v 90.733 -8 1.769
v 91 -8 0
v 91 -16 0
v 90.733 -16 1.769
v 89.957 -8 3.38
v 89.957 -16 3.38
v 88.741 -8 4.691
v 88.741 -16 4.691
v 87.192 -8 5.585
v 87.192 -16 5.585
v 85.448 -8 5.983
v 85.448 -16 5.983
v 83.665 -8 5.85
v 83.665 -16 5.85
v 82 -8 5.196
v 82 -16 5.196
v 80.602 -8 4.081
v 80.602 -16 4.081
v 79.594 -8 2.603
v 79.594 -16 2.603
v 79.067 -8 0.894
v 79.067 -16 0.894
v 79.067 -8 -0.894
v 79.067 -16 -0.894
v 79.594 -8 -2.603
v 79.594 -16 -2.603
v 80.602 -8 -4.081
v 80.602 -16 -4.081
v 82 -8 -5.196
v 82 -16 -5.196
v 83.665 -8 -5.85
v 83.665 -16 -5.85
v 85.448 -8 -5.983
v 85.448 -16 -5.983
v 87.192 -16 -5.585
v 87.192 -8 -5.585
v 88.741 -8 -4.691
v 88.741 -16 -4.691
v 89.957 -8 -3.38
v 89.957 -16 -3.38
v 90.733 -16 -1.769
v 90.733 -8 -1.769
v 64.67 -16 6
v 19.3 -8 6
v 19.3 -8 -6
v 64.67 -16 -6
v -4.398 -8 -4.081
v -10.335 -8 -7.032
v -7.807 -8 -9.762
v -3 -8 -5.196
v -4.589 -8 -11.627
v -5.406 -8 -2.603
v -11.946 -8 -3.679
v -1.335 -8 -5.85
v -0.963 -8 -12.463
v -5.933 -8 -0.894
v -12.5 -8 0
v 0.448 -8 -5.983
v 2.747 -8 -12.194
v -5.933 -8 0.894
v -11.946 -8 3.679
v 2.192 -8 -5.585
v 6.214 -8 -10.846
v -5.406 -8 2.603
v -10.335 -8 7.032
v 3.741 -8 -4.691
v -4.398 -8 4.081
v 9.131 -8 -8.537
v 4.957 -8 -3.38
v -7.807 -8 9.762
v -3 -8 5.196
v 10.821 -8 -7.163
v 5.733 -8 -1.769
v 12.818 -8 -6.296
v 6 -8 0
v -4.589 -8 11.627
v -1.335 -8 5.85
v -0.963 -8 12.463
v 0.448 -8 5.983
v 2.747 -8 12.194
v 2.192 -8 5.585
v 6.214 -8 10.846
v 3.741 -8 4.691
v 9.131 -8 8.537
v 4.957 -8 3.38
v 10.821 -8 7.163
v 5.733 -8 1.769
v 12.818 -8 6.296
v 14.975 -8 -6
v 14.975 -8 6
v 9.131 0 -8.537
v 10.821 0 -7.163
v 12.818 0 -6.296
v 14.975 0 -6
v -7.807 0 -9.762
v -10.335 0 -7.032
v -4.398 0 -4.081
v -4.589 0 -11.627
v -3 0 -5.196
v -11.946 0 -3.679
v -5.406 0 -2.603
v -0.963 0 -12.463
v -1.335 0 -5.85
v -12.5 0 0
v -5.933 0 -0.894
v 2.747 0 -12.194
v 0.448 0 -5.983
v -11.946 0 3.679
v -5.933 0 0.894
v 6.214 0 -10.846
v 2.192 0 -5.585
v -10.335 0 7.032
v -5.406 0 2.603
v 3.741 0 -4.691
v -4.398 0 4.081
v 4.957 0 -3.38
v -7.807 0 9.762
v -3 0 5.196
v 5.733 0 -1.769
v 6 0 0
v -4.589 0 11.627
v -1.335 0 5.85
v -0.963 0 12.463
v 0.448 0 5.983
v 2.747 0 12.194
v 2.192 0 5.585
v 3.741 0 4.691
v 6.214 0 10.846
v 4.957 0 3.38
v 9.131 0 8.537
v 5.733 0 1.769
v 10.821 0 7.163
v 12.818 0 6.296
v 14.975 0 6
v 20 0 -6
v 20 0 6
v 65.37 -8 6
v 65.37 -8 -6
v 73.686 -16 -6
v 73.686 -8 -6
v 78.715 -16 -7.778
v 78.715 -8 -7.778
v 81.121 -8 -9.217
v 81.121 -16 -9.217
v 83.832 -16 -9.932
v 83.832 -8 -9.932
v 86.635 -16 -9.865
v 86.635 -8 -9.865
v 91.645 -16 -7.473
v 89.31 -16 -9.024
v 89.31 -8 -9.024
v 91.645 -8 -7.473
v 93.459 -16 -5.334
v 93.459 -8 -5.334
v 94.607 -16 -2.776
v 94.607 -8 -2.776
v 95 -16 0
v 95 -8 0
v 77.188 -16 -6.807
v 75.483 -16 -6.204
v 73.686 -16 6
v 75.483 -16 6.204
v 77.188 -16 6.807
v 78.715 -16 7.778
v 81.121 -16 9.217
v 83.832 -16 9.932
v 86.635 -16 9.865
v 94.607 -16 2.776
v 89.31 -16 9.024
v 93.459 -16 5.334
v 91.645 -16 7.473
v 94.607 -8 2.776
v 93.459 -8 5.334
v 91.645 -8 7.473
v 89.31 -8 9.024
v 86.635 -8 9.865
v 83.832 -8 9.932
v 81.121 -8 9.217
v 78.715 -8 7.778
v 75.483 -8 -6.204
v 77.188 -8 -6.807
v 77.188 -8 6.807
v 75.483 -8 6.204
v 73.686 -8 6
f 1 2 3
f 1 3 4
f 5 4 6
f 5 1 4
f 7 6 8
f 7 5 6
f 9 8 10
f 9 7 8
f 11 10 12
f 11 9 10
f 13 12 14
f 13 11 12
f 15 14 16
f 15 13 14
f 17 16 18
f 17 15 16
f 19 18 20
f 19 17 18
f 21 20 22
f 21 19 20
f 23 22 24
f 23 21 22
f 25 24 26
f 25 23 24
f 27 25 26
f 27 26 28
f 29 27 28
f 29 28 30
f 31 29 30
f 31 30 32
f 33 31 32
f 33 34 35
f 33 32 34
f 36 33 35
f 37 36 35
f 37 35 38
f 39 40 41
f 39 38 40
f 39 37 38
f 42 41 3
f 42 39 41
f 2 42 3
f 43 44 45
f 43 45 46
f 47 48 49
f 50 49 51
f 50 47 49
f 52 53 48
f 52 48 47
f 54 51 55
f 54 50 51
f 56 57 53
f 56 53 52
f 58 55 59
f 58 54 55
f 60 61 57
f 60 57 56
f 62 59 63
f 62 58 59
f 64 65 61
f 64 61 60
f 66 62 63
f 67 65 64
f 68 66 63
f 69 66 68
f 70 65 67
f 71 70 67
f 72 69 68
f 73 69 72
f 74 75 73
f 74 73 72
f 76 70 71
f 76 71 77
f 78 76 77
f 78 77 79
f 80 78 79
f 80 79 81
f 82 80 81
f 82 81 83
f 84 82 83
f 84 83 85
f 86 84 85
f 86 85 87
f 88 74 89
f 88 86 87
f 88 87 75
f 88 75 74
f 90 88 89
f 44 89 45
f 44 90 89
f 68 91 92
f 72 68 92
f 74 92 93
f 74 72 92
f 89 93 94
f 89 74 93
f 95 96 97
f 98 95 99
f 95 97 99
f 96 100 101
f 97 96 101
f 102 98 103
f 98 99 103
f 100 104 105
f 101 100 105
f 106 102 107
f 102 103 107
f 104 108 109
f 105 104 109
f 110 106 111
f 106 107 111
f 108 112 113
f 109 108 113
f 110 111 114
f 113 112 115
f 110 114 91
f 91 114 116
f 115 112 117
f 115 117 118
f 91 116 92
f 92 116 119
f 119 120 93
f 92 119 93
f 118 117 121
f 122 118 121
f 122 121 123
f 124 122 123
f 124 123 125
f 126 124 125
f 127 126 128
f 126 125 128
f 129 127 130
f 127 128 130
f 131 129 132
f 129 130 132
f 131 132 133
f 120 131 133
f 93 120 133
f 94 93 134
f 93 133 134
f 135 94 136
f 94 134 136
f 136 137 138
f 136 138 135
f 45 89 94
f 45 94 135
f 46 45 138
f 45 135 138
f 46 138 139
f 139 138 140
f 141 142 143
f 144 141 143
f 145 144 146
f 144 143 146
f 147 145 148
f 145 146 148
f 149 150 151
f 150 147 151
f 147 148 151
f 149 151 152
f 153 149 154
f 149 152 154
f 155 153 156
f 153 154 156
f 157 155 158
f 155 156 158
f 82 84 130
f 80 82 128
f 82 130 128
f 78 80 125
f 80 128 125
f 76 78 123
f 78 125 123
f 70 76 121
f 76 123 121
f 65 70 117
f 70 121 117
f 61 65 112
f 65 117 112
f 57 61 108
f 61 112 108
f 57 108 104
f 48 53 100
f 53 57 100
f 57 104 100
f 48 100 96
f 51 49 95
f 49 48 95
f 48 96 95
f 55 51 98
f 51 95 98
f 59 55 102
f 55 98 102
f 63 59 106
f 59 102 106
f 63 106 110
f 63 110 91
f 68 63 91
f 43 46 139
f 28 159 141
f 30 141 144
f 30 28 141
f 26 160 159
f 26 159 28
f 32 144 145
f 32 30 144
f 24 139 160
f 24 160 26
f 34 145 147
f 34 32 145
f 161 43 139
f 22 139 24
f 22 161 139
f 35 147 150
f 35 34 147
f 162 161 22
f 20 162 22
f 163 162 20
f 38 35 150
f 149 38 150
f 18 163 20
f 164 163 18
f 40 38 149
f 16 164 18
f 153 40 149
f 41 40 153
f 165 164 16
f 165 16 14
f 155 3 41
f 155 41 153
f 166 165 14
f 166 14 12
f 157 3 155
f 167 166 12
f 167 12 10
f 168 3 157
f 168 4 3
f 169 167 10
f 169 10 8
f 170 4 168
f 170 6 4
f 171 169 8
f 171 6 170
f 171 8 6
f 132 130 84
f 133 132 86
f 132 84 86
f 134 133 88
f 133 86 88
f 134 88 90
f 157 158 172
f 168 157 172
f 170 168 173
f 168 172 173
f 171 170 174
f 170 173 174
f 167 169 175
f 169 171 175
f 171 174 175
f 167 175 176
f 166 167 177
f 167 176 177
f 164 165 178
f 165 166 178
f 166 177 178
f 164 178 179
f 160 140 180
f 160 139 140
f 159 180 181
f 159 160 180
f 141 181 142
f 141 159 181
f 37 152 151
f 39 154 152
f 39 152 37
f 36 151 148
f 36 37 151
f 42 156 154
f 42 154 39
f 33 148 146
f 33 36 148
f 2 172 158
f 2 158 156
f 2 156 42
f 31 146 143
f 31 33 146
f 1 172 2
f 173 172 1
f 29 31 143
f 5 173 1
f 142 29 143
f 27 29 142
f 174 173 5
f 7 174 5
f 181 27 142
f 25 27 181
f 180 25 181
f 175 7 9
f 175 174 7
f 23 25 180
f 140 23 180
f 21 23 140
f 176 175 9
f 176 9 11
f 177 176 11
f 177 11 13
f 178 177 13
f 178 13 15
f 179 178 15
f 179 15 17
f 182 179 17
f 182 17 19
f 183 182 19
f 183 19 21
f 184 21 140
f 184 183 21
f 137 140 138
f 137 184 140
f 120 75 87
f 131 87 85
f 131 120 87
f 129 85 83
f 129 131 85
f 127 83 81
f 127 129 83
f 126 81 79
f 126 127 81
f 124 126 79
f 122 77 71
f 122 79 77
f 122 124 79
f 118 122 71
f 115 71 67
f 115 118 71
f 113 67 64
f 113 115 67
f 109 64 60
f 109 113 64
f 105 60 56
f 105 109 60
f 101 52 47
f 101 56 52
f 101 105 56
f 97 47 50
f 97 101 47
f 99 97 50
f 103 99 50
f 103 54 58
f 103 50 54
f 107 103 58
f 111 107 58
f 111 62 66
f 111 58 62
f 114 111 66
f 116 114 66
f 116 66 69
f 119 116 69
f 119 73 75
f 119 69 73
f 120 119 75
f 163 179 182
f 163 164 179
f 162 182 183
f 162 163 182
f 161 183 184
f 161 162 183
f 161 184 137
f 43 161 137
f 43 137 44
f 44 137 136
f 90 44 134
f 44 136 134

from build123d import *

# Parameters (mm, degrees)
F0_R     = 6
F1_DEPTH = 25
F3_DEPTH = 12.5
F4_R     = 8


with BuildPart() as f1:
    # F0 (on Front) → F1 (new body)
    with BuildSketch(Plane.XZ):
        with BuildLine():
            ThreePointArc((10.965856, -6), (12.110392, -3.096514), (12.5, 0))
            ThreePointArc((12.5, 0), (12.110392, 3.096514), (10.965856, 6))
            ThreePointArc((10.965856, 6), (-12.5, 0), (10.965856, -6))
        make_face()
        Circle(F0_R, mode=Mode.SUBTRACT)
        with BuildLine():
            ThreePointArc((10.965856, 6), (12.110392, 3.096514), (12.5, 0))
            ThreePointArc((12.5, 0), (12.110392, -3.096514), (10.965856, -6))
            Line((10.965856, -6), (77, -6))
            ThreePointArc((77, -6), (75, 0), (77, 6))
            Line((77, 6), (10.965856, 6))
        make_face()
        with BuildLine():
            ThreePointArc((95, 0), (88.162278, 9.486833), (77, 6))
            ThreePointArc((77, 6), (75, 0), (77, -6))
            ThreePointArc((77, -6), (88.162278, -9.486833), (95, 0))
        make_face()
        with Locations((85, 0)):
            Circle(F0_R, mode=Mode.SUBTRACT)
    extrude(amount=F1_DEPTH)

    # F2 (on Top) → F3 (intersect, symmetric)
    with BuildSketch(Plane.XY):
        Polygon((20, 0), (-12.5, 0), (-12.5, -8), (19.300091, -8), (64.670345, -16), (95, -16), (95, -8), (65.370255, -8), align=None)
    extrude(amount=F3_DEPTH, both=True, mode=Mode.INTERSECT)

    # F4
    f4_edges = [f1.edges().sort_by_distance(p)[0] for p in [
        (10.965856, -4, -6),
        (10.965856, -4, 6),
        (77, -12, 6),
        (77, -12, -6),
    ]]
    fillet(f4_edges, radius=F4_R)


solid = f1.part
